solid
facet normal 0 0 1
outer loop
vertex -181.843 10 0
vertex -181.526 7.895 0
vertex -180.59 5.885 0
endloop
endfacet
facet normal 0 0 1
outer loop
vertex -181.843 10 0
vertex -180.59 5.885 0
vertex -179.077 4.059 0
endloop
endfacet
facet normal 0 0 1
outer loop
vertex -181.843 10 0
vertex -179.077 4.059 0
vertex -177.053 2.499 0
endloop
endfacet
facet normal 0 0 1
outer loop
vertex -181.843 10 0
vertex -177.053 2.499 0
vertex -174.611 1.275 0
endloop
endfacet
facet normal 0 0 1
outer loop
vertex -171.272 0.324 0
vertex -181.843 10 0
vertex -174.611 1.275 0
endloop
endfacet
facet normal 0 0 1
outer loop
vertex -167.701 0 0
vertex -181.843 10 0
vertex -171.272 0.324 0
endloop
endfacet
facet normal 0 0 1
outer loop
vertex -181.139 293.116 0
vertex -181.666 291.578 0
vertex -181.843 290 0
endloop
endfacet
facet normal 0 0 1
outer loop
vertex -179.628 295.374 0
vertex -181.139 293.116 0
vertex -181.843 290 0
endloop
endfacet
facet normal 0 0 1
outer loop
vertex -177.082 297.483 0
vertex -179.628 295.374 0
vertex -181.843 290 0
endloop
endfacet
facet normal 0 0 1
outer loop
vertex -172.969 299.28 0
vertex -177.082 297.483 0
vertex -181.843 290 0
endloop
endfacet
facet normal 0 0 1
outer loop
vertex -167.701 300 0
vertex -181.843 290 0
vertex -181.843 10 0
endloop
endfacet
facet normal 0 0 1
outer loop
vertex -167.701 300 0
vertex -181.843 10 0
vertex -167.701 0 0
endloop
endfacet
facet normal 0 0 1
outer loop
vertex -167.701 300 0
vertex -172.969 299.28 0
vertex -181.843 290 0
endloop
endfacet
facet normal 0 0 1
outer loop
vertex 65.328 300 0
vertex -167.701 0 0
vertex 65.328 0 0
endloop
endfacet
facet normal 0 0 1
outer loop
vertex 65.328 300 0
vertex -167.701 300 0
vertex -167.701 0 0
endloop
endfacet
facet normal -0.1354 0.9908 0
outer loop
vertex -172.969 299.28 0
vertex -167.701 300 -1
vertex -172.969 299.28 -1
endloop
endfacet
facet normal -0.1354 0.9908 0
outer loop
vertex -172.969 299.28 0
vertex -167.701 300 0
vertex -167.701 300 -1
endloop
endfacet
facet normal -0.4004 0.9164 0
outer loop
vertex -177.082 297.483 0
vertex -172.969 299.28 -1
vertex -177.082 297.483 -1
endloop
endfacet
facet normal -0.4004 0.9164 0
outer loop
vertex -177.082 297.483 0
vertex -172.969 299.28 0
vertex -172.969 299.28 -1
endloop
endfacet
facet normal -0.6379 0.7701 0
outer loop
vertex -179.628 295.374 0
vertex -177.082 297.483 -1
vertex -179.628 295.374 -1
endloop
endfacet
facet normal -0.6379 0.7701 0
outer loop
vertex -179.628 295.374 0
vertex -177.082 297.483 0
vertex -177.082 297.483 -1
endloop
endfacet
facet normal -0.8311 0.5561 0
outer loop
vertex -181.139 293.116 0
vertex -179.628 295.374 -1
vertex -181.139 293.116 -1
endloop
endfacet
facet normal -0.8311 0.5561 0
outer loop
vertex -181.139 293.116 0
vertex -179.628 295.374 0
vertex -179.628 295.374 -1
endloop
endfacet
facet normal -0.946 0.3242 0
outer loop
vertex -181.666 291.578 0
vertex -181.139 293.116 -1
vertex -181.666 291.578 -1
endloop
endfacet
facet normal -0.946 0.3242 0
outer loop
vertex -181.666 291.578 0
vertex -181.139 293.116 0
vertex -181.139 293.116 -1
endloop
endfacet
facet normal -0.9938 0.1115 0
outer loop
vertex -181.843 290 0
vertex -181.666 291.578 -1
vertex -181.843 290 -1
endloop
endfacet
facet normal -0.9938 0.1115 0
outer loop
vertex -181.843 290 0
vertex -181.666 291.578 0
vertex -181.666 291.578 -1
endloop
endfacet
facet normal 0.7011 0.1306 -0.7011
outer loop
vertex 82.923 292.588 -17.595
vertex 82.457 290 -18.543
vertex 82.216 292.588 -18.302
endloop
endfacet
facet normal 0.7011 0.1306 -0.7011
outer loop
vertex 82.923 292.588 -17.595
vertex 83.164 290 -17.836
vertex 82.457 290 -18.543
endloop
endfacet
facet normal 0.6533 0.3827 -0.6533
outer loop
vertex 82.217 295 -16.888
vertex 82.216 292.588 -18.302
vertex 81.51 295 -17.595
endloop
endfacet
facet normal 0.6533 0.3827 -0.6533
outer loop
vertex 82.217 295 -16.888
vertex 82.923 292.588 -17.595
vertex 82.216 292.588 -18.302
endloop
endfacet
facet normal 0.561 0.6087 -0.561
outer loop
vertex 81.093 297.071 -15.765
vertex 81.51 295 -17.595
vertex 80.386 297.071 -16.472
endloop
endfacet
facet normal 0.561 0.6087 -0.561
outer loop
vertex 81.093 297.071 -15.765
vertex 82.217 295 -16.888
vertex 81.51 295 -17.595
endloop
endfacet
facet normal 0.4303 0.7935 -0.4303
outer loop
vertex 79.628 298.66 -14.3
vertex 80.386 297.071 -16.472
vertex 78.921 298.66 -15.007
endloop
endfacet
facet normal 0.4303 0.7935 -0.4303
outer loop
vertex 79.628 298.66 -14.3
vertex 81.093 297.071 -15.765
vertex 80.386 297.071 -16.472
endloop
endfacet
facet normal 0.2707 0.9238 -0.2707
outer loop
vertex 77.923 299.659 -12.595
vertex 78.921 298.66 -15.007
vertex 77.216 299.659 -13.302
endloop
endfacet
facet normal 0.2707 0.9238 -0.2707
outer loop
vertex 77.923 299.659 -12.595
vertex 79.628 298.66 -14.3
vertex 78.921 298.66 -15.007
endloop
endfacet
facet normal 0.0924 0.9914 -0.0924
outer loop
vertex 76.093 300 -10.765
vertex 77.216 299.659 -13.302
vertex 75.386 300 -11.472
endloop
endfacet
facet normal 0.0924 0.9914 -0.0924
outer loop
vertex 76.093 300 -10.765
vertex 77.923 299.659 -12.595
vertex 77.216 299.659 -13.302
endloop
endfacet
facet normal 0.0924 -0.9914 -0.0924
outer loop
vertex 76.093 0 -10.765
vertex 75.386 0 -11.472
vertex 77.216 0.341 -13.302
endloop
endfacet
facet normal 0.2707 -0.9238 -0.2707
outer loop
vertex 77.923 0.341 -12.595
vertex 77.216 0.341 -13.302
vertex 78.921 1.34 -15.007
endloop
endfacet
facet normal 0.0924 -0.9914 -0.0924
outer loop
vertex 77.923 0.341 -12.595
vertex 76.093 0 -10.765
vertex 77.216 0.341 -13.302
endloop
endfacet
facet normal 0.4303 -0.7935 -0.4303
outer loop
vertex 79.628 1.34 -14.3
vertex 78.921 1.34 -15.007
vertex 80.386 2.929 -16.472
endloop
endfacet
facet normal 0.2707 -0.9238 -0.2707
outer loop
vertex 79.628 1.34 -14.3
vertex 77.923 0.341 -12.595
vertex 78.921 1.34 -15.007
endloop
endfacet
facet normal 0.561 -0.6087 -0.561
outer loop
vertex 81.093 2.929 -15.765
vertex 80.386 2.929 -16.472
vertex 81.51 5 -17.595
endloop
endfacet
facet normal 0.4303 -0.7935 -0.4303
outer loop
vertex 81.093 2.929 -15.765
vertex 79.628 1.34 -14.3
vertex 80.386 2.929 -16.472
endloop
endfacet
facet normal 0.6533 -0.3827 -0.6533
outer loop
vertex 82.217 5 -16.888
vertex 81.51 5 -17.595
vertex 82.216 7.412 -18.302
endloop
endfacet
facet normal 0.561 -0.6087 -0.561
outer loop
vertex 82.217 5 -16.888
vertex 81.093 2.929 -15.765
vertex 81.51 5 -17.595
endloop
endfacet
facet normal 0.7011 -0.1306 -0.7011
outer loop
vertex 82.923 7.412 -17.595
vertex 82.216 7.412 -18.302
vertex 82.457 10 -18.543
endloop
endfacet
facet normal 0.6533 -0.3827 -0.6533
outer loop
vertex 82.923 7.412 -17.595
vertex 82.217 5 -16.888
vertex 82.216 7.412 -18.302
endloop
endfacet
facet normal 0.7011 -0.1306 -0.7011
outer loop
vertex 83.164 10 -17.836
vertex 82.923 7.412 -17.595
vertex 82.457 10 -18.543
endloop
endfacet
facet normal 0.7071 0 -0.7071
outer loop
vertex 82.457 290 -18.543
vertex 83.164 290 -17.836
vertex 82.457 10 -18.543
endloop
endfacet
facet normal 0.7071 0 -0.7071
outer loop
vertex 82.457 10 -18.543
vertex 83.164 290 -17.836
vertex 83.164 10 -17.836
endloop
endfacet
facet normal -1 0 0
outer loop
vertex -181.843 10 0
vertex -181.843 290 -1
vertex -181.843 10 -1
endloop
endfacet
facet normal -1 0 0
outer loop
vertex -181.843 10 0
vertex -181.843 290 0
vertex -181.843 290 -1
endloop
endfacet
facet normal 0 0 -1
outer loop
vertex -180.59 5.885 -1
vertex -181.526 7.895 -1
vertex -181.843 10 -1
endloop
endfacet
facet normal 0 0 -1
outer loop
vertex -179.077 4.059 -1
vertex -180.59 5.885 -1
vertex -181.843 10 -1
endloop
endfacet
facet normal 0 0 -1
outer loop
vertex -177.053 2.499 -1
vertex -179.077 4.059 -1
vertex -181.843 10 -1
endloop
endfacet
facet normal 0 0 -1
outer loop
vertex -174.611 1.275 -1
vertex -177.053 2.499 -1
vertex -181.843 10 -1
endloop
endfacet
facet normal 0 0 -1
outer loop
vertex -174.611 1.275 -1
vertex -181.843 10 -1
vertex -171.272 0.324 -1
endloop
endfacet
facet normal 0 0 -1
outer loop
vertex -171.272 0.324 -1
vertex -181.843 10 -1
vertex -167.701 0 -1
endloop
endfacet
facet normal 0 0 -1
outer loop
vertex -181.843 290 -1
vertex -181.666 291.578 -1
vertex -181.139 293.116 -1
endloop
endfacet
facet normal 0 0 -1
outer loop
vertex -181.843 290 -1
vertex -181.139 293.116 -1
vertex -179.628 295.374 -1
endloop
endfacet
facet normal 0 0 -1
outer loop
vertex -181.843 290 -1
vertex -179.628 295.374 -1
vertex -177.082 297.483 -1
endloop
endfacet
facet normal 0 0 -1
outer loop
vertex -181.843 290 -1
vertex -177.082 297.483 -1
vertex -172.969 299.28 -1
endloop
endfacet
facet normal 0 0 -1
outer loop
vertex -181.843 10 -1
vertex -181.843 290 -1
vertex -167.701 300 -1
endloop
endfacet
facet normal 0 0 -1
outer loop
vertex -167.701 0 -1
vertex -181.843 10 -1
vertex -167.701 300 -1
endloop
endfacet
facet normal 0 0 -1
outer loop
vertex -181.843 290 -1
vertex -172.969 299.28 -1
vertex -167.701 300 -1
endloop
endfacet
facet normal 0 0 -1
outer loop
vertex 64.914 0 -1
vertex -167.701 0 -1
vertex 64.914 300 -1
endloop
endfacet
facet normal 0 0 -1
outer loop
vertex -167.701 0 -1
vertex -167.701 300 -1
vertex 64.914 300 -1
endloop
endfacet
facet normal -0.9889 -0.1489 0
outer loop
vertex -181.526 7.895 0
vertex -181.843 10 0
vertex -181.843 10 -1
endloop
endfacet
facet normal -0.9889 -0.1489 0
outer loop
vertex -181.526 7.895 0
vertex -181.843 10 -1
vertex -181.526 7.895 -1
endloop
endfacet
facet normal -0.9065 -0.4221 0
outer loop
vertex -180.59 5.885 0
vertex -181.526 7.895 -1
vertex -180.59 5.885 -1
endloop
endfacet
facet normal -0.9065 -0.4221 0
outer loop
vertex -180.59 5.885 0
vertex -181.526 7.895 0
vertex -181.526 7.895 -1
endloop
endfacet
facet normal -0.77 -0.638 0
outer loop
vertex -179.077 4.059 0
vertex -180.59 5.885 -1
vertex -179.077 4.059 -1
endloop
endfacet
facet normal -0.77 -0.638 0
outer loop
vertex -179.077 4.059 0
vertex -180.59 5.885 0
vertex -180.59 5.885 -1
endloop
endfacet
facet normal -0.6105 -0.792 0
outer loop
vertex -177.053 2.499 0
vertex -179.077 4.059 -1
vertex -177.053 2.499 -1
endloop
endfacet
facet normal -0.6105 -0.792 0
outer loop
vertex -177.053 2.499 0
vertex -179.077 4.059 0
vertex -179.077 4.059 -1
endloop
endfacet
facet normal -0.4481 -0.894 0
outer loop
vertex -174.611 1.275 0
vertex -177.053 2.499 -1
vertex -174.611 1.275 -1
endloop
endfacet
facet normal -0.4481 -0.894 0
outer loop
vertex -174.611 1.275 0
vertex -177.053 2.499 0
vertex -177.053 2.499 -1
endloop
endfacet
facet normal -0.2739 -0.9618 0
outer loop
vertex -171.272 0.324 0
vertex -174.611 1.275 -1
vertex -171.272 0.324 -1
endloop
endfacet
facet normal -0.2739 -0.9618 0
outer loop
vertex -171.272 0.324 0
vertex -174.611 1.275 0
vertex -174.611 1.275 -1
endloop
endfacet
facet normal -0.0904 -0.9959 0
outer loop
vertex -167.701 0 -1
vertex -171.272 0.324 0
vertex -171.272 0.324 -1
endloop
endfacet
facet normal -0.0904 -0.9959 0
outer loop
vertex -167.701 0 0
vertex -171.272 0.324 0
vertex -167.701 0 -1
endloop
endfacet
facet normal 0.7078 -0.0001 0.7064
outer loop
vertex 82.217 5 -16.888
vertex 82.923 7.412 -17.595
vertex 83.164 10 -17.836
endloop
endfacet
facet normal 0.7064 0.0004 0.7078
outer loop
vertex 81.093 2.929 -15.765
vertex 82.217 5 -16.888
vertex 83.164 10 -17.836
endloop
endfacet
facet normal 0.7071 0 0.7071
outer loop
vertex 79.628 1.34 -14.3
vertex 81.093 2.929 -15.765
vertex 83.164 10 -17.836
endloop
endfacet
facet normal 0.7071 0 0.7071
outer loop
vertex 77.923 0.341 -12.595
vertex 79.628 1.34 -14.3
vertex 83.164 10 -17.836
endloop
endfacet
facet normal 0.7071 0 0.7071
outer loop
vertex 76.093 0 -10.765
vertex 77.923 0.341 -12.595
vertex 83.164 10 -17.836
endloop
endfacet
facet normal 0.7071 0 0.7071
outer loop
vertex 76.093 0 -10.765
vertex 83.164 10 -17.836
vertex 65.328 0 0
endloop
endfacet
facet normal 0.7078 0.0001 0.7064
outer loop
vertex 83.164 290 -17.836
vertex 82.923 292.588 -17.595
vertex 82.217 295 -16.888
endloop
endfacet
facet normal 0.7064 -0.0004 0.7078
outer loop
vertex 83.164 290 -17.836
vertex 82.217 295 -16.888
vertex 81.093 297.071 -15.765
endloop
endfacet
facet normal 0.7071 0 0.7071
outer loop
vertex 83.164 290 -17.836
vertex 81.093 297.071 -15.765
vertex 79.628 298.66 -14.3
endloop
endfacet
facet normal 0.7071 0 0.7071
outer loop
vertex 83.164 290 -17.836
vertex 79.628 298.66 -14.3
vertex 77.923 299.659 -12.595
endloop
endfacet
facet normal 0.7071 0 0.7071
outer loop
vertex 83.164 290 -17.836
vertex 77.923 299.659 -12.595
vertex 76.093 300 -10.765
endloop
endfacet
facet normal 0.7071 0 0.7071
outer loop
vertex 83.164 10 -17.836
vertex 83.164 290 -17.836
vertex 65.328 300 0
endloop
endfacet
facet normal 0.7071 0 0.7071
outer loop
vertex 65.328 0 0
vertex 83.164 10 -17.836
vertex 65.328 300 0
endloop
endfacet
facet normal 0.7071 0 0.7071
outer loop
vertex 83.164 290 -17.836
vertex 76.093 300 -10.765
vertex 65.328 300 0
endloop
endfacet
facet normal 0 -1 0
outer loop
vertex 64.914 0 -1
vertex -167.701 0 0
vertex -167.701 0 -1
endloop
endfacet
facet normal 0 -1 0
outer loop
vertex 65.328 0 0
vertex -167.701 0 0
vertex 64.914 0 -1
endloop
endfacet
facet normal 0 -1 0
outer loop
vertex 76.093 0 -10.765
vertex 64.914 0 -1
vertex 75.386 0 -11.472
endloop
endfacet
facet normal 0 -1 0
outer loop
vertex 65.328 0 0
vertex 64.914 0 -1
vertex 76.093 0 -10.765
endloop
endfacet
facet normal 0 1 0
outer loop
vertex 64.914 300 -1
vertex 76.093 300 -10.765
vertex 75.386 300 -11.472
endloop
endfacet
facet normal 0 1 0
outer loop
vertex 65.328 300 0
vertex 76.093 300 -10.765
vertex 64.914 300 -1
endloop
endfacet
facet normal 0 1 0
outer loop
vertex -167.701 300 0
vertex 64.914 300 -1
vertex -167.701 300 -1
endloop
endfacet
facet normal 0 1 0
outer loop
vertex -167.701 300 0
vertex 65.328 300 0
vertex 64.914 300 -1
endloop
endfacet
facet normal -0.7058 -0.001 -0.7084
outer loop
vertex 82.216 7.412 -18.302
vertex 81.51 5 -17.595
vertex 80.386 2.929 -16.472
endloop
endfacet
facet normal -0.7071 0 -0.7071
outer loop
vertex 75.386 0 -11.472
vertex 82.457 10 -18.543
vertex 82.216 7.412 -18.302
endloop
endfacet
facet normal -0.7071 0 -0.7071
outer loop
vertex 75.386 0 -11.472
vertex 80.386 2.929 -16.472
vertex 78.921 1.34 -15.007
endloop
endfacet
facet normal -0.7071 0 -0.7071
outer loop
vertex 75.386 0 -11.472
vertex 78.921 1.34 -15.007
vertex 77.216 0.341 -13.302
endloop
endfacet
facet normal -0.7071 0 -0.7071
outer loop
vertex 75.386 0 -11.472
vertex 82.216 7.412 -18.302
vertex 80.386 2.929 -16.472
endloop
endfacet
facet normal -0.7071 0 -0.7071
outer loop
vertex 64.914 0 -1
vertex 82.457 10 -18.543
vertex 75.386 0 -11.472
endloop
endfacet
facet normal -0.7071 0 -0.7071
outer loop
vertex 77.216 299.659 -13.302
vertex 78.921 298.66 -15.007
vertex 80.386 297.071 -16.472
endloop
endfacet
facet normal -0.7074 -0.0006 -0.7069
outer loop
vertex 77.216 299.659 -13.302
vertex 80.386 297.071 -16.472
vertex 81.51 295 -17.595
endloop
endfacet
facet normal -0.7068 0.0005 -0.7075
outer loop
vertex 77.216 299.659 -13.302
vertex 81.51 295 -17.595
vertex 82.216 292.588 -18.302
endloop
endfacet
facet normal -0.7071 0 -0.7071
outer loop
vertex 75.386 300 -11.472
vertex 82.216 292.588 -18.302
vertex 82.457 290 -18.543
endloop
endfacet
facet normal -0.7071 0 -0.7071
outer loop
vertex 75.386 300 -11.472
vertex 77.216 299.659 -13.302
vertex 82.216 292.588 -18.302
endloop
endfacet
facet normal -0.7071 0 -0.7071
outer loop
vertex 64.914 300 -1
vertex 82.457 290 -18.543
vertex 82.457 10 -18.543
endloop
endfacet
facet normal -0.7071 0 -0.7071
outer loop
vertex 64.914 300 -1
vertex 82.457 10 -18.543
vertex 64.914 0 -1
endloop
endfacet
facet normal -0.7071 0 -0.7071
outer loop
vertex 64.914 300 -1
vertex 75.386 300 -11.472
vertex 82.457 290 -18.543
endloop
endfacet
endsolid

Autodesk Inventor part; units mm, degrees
ref_plane "YZ Plane" through (0, 0, 0) normal (1, 0, 0) x (0, 1, 0)
ref_plane "XZ Plane" through (0, 0, 0) normal (0, 1, 0) x (-1, 0, 0)
ref_plane "XY Plane" through (0, 0, 0) normal (0, 0, 1) x (1, 0, 0)
sketch "Sketch1" plane through (0, 0, 0) normal (0, 0, 1) x (1, 0, 0)
  line L0 (-167.701, 0) -> (65.3284, 0) projected
  line L1 (76.0929, 0) -> (65.3284, 0) projected
  ellipse E0 centre (76.0929, 10) end of major axis (76.0929, 20) minor radius 7.0711 (76.0929, 0) -> (83.164, 10) ccw projected
  line L2 (83.164, 290) -> (83.164, 10) projected
  ellipse E1 centre (76.0929, 290) end of major axis (76.0929, 280) minor radius 7.0711 (83.164, 290) -> (76.0929, 300) ccw projected
  line L3 (65.3284, 300) -> (76.0929, 300) projected
  line L4 (65.3284, 300) -> (-167.701, 300) projected
  line L5 (-181.8431, 290) -> (-181.8431, 10) projected
  ellipse E2 centre (-167.701, 10) end of major axis (-181.8431, 10) minor radius 10 (-181.8431, 10) -> (-167.701, 0) ccw projected
  ellipse E3 centre (-167.701, 290) end of major axis (-153.5589, 290) minor radius 10 (-167.701, 300) -> (-181.8431, 290) ccw projected
  line L6 (65.3284, 300) -> (65.3284, 0)
  point P0 (0, 0)
extrude "Extrusion1" add sketch "Sketch1" against normal blind 1 contours E2 L5 E3 L4 L6 L0
ref_plane "Work Plane1" through (-51.1863, 0, 116.5147) normal (-0.7071, 0, -0.7071) x (-0.7071, 0, 0.7071)
sketch "Sketch2" plane through (-51.1863, 0, 116.5147) normal (-0.7071, 0, -0.7071) x (-0.7071, 0, 0.7071)
  line L0 (-164.7767, 0) -> (-164.7767, 300) projected
  line L1 (-190, 290) -> (-190, 10) projected
  arc A0 (-190, 10) -> (-180, 0) centre (-180, 10) ccw projected
  line L2 (-180, 0) -> (-164.7767, 0) projected
  line L3 (-164.7767, 300) -> (-180, 300) projected
  arc A1 (-180, 300) -> (-190, 290) centre (-180, 290) ccw projected
  point P0 (-118.5825, 0)
extrude "Extrusion2" add sketch "Sketch2" along normal blind 1
properties part number "Top Cover" material "Aluminum 6061"
